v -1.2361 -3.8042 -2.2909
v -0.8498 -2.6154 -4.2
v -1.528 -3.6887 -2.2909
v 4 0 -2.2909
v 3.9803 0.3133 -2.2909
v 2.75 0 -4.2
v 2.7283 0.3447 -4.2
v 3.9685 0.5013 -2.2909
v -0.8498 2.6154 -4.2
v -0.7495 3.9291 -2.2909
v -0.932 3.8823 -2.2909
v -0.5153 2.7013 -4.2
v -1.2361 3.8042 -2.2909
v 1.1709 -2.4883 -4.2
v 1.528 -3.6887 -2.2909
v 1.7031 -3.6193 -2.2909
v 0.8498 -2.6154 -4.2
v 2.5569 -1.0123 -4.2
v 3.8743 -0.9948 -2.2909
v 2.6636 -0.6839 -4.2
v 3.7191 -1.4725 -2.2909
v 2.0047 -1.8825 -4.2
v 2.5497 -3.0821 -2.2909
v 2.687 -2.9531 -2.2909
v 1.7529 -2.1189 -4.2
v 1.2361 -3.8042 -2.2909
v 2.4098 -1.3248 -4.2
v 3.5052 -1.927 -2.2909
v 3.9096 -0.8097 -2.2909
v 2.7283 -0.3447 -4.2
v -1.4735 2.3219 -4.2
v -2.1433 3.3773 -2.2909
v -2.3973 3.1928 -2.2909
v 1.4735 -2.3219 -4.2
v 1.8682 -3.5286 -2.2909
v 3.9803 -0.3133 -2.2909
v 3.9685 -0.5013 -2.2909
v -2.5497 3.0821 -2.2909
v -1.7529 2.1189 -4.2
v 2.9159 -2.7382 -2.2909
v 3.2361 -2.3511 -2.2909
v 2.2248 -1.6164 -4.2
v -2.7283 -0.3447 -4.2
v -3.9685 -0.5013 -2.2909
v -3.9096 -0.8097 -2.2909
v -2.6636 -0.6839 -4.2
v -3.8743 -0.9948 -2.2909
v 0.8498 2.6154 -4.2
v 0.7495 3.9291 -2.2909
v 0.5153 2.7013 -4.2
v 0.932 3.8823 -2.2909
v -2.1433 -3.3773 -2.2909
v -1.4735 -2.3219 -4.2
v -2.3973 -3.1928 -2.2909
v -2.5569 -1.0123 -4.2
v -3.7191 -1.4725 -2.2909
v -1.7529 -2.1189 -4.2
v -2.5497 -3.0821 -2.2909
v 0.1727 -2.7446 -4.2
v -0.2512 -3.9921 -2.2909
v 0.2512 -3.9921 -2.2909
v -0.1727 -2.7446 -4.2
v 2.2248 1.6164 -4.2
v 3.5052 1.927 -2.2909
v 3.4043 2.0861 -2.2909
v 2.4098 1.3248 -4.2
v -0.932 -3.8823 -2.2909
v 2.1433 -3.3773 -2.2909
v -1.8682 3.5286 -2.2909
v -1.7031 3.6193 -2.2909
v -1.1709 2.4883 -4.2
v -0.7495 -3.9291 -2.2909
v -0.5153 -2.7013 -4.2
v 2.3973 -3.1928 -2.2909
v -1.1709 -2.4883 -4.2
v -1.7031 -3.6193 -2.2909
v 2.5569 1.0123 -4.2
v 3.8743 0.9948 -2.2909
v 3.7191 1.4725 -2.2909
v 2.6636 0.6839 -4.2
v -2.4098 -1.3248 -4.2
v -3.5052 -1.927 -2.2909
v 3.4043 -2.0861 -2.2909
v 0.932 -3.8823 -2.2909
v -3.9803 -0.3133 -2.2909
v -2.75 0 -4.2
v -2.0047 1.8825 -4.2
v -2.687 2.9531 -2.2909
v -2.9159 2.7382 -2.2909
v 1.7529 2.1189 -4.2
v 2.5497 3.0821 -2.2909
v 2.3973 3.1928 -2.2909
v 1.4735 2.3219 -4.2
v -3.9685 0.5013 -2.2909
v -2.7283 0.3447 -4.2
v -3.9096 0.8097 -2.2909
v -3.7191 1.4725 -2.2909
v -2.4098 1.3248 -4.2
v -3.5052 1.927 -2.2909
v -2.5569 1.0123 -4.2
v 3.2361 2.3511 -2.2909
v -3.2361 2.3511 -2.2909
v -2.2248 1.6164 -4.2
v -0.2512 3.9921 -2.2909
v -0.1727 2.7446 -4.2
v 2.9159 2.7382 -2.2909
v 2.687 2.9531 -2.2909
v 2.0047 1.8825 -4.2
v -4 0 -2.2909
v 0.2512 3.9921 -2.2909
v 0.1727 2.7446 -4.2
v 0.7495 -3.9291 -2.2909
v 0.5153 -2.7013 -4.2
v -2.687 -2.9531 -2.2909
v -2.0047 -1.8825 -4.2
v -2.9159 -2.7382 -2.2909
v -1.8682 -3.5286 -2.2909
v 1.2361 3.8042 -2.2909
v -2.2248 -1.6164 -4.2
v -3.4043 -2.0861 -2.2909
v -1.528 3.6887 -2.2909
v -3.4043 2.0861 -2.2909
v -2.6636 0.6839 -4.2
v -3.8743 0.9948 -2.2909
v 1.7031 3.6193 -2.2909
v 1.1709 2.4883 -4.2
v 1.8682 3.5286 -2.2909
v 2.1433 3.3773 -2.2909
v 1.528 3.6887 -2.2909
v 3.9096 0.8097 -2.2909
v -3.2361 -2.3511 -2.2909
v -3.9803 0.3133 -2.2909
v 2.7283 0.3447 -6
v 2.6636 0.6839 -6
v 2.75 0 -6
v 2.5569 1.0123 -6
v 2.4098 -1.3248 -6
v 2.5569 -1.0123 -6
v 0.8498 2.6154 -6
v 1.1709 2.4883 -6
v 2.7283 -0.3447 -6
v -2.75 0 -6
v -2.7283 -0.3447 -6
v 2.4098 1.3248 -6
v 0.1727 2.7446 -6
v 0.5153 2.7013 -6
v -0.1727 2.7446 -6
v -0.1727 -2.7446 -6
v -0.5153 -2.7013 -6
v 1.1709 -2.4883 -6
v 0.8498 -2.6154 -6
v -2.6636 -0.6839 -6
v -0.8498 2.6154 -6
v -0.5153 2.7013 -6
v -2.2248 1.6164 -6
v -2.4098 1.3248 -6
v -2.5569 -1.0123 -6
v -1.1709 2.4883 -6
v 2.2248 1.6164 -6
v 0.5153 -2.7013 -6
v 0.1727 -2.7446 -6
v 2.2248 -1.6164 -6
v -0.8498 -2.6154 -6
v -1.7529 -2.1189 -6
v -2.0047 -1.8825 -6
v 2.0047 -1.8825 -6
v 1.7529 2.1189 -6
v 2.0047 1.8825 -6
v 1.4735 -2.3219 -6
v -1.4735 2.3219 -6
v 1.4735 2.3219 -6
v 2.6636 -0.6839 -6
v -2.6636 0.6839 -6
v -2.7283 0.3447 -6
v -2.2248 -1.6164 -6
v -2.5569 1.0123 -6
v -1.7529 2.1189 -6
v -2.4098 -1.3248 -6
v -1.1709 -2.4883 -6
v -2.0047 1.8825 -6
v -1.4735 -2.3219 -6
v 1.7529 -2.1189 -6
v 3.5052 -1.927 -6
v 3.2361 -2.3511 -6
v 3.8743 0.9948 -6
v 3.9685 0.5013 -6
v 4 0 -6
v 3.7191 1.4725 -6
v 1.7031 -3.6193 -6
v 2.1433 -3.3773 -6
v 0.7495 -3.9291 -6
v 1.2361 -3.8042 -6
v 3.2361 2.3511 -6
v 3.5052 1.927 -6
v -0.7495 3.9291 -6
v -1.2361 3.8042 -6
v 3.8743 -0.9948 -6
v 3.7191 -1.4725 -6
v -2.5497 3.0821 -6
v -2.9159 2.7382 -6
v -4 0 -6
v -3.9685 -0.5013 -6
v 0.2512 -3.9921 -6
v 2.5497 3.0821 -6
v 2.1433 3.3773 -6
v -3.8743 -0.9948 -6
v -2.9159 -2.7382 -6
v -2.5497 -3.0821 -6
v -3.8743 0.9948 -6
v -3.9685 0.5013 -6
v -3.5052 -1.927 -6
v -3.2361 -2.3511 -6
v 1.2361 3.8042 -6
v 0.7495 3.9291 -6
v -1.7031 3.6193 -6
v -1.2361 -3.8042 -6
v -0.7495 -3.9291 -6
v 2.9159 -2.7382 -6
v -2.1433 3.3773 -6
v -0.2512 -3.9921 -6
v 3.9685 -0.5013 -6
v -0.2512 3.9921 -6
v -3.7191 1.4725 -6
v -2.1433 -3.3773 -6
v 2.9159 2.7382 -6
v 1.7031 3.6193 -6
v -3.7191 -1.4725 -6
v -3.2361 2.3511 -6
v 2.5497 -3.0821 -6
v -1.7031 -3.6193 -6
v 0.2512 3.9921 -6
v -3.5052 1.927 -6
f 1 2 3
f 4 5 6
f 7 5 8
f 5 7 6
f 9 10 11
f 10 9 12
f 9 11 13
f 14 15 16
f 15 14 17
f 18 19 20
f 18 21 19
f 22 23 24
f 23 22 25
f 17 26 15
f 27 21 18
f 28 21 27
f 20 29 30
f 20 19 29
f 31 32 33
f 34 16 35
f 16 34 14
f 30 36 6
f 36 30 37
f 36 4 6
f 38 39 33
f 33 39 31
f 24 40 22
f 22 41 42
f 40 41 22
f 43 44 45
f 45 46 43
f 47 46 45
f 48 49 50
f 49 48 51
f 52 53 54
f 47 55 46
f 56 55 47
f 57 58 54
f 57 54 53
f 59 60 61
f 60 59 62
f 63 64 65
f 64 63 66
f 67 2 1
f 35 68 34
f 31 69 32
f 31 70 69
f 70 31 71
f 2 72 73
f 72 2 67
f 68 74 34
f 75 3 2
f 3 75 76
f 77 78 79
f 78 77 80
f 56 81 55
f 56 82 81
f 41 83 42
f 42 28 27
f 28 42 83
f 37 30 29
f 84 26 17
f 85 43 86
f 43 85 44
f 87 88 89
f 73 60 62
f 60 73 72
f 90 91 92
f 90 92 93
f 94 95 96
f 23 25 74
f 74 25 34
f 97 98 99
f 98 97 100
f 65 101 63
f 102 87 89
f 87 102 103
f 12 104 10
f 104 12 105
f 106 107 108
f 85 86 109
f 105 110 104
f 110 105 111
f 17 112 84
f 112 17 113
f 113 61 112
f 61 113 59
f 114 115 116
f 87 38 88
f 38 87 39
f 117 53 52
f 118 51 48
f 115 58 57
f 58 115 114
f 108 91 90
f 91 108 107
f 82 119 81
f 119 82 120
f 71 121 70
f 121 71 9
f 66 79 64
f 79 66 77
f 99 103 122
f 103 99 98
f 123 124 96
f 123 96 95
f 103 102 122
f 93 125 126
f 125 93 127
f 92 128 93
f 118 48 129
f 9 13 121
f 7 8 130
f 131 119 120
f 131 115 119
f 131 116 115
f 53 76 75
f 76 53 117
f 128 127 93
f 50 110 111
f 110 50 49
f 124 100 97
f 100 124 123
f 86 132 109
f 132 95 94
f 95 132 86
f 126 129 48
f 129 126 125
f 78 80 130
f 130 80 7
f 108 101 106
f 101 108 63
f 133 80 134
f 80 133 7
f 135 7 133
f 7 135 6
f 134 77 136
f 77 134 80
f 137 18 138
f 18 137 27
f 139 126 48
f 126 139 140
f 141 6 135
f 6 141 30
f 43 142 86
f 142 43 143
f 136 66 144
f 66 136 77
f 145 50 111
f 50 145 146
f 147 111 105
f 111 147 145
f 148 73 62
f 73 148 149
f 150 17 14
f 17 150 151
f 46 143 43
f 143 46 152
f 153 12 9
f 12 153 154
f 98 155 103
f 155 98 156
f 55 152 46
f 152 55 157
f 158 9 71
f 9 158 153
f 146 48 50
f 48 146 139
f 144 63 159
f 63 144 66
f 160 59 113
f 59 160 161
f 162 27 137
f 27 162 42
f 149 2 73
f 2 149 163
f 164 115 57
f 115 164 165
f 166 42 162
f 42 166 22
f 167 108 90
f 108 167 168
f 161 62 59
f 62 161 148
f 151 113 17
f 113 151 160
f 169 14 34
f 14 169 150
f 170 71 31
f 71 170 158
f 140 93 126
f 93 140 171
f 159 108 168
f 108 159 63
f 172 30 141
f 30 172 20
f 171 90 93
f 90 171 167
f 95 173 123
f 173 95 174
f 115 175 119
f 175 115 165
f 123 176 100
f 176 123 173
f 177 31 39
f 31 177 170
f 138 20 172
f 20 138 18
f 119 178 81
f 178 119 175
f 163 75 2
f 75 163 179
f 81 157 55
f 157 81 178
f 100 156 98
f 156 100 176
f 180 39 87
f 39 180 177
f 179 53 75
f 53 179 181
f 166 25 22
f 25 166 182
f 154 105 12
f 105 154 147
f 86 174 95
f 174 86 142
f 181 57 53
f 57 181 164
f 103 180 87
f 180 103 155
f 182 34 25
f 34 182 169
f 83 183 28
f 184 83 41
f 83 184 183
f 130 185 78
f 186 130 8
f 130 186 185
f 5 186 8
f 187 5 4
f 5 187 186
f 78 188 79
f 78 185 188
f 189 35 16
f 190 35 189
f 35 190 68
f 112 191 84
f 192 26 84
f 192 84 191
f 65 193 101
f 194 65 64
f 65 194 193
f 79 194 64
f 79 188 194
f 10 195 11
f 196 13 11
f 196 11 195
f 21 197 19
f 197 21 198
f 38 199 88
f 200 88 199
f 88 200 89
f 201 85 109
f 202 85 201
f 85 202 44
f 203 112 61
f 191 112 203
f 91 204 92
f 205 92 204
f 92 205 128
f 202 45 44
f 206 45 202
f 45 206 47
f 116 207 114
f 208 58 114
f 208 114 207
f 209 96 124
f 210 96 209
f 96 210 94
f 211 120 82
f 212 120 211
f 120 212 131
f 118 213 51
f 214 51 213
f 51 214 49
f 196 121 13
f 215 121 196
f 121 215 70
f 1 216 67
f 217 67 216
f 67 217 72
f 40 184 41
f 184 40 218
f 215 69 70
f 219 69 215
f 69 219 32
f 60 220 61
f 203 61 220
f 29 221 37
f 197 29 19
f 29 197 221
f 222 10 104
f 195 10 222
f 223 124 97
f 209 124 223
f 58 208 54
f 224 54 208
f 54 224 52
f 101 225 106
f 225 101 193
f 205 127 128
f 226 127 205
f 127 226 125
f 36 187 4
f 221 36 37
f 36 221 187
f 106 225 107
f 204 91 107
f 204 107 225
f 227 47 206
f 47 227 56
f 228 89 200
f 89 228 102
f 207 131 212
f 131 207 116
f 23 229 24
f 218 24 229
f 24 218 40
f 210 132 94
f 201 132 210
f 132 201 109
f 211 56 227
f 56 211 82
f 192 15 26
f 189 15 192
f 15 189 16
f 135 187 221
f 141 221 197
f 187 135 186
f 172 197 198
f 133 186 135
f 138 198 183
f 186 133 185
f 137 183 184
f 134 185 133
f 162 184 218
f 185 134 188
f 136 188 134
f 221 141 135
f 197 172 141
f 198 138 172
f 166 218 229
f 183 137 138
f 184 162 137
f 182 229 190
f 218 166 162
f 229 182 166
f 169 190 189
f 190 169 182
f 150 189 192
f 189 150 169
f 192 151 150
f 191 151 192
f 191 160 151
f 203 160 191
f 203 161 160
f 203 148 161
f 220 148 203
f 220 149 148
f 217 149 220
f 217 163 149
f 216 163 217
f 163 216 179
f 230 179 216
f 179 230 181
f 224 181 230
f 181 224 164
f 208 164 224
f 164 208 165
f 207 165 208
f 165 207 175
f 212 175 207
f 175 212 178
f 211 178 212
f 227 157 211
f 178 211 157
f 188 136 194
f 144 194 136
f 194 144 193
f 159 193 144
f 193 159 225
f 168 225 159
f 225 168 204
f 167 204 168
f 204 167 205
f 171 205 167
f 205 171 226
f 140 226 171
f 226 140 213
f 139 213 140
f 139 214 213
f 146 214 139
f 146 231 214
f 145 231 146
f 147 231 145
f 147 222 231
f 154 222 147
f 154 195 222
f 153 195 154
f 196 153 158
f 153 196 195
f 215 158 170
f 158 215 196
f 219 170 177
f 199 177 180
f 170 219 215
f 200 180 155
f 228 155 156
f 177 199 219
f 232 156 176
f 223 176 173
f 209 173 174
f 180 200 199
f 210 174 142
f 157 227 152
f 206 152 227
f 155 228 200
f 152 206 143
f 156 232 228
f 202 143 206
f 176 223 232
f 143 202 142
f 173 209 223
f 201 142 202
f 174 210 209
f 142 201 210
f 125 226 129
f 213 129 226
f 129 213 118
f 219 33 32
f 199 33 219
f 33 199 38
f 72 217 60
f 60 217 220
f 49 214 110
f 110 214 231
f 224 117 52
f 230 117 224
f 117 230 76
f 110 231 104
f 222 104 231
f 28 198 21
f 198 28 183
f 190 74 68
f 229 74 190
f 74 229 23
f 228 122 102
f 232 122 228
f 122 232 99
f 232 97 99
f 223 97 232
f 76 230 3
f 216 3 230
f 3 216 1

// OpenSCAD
$fn = 50;

difference() {
	union() {
		translate(v = [0, 0, -6.0]) {
			cylinder(h = 9, r = 4.0);
		}
	}
	union() {
		translate(v = [0, 0, 0]) {
			rotate(a = [0, 0, 0]) {
				difference() {
					union() {
						translate(v = [0, 0, -9.0]) {
							cylinder(h = 9, r = 2.25);
						}
						translate(v = [0, 0, -4.2]) {
							cylinder(h = 4.2, r1 = 2.75, r2 = 5.5);
						}
						translate(v = [0, 0, -9.0]) {
							cylinder(h = 9, r = 2.75);
						}
						translate(v = [0, 0, -9.0]) {
							cylinder(h = 9, r = 2.25);
						}
					}
					union();
				}
			}
		}
		#cylinder(h = 3, r = 6.25);
	}
}
